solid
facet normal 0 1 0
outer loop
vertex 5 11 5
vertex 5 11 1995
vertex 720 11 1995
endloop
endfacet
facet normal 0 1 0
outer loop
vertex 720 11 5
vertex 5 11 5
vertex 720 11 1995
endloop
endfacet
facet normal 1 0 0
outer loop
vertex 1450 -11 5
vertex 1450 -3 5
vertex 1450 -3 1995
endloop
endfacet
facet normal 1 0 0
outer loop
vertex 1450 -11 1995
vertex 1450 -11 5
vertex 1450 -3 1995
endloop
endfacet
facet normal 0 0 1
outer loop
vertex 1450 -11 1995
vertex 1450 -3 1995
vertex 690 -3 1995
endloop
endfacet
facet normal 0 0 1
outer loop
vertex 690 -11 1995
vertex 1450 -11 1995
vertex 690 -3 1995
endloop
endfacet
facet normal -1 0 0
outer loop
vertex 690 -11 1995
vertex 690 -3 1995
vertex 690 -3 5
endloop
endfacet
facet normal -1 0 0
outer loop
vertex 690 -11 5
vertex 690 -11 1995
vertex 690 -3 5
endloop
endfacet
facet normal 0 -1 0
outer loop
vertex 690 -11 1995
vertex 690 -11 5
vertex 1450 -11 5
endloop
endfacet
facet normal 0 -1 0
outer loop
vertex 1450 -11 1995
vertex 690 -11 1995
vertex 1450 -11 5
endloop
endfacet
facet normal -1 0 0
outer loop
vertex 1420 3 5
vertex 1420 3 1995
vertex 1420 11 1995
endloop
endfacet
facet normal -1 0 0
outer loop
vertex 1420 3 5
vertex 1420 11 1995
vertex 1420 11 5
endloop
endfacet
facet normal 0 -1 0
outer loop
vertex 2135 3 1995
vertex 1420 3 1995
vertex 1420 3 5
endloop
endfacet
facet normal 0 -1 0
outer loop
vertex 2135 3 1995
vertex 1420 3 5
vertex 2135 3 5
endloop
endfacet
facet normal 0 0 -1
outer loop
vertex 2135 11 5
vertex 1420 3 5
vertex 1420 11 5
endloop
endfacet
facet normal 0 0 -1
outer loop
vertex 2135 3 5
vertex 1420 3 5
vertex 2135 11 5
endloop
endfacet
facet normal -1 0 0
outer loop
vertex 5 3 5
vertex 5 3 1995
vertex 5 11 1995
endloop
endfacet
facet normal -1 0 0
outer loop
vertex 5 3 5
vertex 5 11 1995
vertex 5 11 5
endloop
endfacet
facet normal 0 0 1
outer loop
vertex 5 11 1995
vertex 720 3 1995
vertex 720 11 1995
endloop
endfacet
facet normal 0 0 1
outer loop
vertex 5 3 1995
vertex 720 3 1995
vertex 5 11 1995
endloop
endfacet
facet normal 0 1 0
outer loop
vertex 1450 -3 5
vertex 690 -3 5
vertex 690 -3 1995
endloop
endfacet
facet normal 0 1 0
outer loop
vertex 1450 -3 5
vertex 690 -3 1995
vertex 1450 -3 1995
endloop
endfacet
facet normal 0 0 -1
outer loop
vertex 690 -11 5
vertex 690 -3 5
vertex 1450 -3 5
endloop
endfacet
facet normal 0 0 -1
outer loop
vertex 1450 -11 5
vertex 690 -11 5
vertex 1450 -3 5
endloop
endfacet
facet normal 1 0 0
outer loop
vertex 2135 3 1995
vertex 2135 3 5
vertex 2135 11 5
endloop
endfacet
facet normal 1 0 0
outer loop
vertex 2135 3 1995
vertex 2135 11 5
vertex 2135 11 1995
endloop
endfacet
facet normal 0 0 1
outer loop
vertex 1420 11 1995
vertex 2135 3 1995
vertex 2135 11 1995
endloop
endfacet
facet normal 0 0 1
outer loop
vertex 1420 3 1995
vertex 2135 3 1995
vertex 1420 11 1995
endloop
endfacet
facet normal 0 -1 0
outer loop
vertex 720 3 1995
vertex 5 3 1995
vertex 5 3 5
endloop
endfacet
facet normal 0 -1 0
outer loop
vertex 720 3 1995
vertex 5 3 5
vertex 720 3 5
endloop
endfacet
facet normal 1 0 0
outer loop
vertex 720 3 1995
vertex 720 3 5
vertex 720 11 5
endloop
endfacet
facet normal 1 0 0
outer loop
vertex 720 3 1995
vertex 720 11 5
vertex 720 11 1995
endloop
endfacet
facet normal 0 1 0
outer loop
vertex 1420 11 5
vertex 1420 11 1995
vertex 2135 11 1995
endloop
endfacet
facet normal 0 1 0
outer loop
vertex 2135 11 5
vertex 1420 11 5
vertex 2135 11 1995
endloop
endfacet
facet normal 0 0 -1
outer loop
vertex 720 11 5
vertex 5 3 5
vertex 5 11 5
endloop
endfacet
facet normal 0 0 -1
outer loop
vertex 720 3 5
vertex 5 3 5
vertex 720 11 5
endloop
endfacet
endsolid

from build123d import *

# Parameters (mm, degrees)
F1_START = -3
F0_W     = 670
F0_H     = 1900
F0_W_2   = 30
F0_H_2   = 45
F1_DEPTH = 8
F2_START = 3
F0_W_3   = 700
F2_DEPTH = 8


with BuildPart() as f1:
    # F0 (on Front) → F1 (new body)
    with BuildSketch(Plane.XZ.offset(F1_START)):
        with Locations((355, 1000)):
            Rectangle(F0_W, F0_H)
        Polygon((690, 1995), (5, 1995), (5, 5), (690, 5), (690, 50), (20, 50), (20, 1950), (690, 1950), align=None)
        with Locations((705, 1972.5)):
            Rectangle(F0_W_2, F0_H_2)
        with Locations((705, 1000)):
            Rectangle(F0_W_2, F0_H)
        with Locations((705, 27.5)):
            Rectangle(F0_W_2, F0_H_2)
    extrude(amount=-F1_DEPTH)


with BuildPart() as f1b:
    # F0 (on Front) → F1, piece 2 (new body)
    with BuildSketch(Plane.XZ.offset(F1_START)):
        with Locations((1785, 1000)):
            Rectangle(F0_W, F0_H)
        Polygon((2135, 1995), (1450, 1995), (1450, 1950), (2120, 1950), (2120, 50), (1450, 50), (1450, 5), (2135, 5), align=None)
        with Locations((1435, 1972.5)):
            Rectangle(F0_W_2, F0_H_2)
        with Locations((1435, 1000)):
            Rectangle(F0_W_2, F0_H)
        with Locations((1435, 27.5)):
            Rectangle(F0_W_2, F0_H_2)
    extrude(amount=-F1_DEPTH)


with BuildPart() as f2:
    # F0 (on Front) → F2 (new body)
    with BuildSketch(Plane.XZ.offset(F2_START)):
        with Locations((1070, 1972.5)):
            Rectangle(F0_W_3, F0_H_2)
        with Locations((1070, 1000)):
            Rectangle(F0_W_3, F0_H)
        with Locations((1435, 1972.5)):
            Rectangle(F0_W_2, F0_H_2)
        with Locations((1435, 1000)):
            Rectangle(F0_W_2, F0_H)
        with Locations((705, 1972.5)):
            Rectangle(F0_W_2, F0_H_2)
        with Locations((705, 1000)):
            Rectangle(F0_W_2, F0_H)
        with Locations((705, 27.5)):
            Rectangle(F0_W_2, F0_H_2)
        with Locations((1070, 27.5)):
            Rectangle(F0_W_3, F0_H_2)
        with Locations((1435, 27.5)):
            Rectangle(F0_W_2, F0_H_2)
    extrude(amount=F2_DEPTH)


solid = Compound([f1.part, f1b.part, f2.part])
